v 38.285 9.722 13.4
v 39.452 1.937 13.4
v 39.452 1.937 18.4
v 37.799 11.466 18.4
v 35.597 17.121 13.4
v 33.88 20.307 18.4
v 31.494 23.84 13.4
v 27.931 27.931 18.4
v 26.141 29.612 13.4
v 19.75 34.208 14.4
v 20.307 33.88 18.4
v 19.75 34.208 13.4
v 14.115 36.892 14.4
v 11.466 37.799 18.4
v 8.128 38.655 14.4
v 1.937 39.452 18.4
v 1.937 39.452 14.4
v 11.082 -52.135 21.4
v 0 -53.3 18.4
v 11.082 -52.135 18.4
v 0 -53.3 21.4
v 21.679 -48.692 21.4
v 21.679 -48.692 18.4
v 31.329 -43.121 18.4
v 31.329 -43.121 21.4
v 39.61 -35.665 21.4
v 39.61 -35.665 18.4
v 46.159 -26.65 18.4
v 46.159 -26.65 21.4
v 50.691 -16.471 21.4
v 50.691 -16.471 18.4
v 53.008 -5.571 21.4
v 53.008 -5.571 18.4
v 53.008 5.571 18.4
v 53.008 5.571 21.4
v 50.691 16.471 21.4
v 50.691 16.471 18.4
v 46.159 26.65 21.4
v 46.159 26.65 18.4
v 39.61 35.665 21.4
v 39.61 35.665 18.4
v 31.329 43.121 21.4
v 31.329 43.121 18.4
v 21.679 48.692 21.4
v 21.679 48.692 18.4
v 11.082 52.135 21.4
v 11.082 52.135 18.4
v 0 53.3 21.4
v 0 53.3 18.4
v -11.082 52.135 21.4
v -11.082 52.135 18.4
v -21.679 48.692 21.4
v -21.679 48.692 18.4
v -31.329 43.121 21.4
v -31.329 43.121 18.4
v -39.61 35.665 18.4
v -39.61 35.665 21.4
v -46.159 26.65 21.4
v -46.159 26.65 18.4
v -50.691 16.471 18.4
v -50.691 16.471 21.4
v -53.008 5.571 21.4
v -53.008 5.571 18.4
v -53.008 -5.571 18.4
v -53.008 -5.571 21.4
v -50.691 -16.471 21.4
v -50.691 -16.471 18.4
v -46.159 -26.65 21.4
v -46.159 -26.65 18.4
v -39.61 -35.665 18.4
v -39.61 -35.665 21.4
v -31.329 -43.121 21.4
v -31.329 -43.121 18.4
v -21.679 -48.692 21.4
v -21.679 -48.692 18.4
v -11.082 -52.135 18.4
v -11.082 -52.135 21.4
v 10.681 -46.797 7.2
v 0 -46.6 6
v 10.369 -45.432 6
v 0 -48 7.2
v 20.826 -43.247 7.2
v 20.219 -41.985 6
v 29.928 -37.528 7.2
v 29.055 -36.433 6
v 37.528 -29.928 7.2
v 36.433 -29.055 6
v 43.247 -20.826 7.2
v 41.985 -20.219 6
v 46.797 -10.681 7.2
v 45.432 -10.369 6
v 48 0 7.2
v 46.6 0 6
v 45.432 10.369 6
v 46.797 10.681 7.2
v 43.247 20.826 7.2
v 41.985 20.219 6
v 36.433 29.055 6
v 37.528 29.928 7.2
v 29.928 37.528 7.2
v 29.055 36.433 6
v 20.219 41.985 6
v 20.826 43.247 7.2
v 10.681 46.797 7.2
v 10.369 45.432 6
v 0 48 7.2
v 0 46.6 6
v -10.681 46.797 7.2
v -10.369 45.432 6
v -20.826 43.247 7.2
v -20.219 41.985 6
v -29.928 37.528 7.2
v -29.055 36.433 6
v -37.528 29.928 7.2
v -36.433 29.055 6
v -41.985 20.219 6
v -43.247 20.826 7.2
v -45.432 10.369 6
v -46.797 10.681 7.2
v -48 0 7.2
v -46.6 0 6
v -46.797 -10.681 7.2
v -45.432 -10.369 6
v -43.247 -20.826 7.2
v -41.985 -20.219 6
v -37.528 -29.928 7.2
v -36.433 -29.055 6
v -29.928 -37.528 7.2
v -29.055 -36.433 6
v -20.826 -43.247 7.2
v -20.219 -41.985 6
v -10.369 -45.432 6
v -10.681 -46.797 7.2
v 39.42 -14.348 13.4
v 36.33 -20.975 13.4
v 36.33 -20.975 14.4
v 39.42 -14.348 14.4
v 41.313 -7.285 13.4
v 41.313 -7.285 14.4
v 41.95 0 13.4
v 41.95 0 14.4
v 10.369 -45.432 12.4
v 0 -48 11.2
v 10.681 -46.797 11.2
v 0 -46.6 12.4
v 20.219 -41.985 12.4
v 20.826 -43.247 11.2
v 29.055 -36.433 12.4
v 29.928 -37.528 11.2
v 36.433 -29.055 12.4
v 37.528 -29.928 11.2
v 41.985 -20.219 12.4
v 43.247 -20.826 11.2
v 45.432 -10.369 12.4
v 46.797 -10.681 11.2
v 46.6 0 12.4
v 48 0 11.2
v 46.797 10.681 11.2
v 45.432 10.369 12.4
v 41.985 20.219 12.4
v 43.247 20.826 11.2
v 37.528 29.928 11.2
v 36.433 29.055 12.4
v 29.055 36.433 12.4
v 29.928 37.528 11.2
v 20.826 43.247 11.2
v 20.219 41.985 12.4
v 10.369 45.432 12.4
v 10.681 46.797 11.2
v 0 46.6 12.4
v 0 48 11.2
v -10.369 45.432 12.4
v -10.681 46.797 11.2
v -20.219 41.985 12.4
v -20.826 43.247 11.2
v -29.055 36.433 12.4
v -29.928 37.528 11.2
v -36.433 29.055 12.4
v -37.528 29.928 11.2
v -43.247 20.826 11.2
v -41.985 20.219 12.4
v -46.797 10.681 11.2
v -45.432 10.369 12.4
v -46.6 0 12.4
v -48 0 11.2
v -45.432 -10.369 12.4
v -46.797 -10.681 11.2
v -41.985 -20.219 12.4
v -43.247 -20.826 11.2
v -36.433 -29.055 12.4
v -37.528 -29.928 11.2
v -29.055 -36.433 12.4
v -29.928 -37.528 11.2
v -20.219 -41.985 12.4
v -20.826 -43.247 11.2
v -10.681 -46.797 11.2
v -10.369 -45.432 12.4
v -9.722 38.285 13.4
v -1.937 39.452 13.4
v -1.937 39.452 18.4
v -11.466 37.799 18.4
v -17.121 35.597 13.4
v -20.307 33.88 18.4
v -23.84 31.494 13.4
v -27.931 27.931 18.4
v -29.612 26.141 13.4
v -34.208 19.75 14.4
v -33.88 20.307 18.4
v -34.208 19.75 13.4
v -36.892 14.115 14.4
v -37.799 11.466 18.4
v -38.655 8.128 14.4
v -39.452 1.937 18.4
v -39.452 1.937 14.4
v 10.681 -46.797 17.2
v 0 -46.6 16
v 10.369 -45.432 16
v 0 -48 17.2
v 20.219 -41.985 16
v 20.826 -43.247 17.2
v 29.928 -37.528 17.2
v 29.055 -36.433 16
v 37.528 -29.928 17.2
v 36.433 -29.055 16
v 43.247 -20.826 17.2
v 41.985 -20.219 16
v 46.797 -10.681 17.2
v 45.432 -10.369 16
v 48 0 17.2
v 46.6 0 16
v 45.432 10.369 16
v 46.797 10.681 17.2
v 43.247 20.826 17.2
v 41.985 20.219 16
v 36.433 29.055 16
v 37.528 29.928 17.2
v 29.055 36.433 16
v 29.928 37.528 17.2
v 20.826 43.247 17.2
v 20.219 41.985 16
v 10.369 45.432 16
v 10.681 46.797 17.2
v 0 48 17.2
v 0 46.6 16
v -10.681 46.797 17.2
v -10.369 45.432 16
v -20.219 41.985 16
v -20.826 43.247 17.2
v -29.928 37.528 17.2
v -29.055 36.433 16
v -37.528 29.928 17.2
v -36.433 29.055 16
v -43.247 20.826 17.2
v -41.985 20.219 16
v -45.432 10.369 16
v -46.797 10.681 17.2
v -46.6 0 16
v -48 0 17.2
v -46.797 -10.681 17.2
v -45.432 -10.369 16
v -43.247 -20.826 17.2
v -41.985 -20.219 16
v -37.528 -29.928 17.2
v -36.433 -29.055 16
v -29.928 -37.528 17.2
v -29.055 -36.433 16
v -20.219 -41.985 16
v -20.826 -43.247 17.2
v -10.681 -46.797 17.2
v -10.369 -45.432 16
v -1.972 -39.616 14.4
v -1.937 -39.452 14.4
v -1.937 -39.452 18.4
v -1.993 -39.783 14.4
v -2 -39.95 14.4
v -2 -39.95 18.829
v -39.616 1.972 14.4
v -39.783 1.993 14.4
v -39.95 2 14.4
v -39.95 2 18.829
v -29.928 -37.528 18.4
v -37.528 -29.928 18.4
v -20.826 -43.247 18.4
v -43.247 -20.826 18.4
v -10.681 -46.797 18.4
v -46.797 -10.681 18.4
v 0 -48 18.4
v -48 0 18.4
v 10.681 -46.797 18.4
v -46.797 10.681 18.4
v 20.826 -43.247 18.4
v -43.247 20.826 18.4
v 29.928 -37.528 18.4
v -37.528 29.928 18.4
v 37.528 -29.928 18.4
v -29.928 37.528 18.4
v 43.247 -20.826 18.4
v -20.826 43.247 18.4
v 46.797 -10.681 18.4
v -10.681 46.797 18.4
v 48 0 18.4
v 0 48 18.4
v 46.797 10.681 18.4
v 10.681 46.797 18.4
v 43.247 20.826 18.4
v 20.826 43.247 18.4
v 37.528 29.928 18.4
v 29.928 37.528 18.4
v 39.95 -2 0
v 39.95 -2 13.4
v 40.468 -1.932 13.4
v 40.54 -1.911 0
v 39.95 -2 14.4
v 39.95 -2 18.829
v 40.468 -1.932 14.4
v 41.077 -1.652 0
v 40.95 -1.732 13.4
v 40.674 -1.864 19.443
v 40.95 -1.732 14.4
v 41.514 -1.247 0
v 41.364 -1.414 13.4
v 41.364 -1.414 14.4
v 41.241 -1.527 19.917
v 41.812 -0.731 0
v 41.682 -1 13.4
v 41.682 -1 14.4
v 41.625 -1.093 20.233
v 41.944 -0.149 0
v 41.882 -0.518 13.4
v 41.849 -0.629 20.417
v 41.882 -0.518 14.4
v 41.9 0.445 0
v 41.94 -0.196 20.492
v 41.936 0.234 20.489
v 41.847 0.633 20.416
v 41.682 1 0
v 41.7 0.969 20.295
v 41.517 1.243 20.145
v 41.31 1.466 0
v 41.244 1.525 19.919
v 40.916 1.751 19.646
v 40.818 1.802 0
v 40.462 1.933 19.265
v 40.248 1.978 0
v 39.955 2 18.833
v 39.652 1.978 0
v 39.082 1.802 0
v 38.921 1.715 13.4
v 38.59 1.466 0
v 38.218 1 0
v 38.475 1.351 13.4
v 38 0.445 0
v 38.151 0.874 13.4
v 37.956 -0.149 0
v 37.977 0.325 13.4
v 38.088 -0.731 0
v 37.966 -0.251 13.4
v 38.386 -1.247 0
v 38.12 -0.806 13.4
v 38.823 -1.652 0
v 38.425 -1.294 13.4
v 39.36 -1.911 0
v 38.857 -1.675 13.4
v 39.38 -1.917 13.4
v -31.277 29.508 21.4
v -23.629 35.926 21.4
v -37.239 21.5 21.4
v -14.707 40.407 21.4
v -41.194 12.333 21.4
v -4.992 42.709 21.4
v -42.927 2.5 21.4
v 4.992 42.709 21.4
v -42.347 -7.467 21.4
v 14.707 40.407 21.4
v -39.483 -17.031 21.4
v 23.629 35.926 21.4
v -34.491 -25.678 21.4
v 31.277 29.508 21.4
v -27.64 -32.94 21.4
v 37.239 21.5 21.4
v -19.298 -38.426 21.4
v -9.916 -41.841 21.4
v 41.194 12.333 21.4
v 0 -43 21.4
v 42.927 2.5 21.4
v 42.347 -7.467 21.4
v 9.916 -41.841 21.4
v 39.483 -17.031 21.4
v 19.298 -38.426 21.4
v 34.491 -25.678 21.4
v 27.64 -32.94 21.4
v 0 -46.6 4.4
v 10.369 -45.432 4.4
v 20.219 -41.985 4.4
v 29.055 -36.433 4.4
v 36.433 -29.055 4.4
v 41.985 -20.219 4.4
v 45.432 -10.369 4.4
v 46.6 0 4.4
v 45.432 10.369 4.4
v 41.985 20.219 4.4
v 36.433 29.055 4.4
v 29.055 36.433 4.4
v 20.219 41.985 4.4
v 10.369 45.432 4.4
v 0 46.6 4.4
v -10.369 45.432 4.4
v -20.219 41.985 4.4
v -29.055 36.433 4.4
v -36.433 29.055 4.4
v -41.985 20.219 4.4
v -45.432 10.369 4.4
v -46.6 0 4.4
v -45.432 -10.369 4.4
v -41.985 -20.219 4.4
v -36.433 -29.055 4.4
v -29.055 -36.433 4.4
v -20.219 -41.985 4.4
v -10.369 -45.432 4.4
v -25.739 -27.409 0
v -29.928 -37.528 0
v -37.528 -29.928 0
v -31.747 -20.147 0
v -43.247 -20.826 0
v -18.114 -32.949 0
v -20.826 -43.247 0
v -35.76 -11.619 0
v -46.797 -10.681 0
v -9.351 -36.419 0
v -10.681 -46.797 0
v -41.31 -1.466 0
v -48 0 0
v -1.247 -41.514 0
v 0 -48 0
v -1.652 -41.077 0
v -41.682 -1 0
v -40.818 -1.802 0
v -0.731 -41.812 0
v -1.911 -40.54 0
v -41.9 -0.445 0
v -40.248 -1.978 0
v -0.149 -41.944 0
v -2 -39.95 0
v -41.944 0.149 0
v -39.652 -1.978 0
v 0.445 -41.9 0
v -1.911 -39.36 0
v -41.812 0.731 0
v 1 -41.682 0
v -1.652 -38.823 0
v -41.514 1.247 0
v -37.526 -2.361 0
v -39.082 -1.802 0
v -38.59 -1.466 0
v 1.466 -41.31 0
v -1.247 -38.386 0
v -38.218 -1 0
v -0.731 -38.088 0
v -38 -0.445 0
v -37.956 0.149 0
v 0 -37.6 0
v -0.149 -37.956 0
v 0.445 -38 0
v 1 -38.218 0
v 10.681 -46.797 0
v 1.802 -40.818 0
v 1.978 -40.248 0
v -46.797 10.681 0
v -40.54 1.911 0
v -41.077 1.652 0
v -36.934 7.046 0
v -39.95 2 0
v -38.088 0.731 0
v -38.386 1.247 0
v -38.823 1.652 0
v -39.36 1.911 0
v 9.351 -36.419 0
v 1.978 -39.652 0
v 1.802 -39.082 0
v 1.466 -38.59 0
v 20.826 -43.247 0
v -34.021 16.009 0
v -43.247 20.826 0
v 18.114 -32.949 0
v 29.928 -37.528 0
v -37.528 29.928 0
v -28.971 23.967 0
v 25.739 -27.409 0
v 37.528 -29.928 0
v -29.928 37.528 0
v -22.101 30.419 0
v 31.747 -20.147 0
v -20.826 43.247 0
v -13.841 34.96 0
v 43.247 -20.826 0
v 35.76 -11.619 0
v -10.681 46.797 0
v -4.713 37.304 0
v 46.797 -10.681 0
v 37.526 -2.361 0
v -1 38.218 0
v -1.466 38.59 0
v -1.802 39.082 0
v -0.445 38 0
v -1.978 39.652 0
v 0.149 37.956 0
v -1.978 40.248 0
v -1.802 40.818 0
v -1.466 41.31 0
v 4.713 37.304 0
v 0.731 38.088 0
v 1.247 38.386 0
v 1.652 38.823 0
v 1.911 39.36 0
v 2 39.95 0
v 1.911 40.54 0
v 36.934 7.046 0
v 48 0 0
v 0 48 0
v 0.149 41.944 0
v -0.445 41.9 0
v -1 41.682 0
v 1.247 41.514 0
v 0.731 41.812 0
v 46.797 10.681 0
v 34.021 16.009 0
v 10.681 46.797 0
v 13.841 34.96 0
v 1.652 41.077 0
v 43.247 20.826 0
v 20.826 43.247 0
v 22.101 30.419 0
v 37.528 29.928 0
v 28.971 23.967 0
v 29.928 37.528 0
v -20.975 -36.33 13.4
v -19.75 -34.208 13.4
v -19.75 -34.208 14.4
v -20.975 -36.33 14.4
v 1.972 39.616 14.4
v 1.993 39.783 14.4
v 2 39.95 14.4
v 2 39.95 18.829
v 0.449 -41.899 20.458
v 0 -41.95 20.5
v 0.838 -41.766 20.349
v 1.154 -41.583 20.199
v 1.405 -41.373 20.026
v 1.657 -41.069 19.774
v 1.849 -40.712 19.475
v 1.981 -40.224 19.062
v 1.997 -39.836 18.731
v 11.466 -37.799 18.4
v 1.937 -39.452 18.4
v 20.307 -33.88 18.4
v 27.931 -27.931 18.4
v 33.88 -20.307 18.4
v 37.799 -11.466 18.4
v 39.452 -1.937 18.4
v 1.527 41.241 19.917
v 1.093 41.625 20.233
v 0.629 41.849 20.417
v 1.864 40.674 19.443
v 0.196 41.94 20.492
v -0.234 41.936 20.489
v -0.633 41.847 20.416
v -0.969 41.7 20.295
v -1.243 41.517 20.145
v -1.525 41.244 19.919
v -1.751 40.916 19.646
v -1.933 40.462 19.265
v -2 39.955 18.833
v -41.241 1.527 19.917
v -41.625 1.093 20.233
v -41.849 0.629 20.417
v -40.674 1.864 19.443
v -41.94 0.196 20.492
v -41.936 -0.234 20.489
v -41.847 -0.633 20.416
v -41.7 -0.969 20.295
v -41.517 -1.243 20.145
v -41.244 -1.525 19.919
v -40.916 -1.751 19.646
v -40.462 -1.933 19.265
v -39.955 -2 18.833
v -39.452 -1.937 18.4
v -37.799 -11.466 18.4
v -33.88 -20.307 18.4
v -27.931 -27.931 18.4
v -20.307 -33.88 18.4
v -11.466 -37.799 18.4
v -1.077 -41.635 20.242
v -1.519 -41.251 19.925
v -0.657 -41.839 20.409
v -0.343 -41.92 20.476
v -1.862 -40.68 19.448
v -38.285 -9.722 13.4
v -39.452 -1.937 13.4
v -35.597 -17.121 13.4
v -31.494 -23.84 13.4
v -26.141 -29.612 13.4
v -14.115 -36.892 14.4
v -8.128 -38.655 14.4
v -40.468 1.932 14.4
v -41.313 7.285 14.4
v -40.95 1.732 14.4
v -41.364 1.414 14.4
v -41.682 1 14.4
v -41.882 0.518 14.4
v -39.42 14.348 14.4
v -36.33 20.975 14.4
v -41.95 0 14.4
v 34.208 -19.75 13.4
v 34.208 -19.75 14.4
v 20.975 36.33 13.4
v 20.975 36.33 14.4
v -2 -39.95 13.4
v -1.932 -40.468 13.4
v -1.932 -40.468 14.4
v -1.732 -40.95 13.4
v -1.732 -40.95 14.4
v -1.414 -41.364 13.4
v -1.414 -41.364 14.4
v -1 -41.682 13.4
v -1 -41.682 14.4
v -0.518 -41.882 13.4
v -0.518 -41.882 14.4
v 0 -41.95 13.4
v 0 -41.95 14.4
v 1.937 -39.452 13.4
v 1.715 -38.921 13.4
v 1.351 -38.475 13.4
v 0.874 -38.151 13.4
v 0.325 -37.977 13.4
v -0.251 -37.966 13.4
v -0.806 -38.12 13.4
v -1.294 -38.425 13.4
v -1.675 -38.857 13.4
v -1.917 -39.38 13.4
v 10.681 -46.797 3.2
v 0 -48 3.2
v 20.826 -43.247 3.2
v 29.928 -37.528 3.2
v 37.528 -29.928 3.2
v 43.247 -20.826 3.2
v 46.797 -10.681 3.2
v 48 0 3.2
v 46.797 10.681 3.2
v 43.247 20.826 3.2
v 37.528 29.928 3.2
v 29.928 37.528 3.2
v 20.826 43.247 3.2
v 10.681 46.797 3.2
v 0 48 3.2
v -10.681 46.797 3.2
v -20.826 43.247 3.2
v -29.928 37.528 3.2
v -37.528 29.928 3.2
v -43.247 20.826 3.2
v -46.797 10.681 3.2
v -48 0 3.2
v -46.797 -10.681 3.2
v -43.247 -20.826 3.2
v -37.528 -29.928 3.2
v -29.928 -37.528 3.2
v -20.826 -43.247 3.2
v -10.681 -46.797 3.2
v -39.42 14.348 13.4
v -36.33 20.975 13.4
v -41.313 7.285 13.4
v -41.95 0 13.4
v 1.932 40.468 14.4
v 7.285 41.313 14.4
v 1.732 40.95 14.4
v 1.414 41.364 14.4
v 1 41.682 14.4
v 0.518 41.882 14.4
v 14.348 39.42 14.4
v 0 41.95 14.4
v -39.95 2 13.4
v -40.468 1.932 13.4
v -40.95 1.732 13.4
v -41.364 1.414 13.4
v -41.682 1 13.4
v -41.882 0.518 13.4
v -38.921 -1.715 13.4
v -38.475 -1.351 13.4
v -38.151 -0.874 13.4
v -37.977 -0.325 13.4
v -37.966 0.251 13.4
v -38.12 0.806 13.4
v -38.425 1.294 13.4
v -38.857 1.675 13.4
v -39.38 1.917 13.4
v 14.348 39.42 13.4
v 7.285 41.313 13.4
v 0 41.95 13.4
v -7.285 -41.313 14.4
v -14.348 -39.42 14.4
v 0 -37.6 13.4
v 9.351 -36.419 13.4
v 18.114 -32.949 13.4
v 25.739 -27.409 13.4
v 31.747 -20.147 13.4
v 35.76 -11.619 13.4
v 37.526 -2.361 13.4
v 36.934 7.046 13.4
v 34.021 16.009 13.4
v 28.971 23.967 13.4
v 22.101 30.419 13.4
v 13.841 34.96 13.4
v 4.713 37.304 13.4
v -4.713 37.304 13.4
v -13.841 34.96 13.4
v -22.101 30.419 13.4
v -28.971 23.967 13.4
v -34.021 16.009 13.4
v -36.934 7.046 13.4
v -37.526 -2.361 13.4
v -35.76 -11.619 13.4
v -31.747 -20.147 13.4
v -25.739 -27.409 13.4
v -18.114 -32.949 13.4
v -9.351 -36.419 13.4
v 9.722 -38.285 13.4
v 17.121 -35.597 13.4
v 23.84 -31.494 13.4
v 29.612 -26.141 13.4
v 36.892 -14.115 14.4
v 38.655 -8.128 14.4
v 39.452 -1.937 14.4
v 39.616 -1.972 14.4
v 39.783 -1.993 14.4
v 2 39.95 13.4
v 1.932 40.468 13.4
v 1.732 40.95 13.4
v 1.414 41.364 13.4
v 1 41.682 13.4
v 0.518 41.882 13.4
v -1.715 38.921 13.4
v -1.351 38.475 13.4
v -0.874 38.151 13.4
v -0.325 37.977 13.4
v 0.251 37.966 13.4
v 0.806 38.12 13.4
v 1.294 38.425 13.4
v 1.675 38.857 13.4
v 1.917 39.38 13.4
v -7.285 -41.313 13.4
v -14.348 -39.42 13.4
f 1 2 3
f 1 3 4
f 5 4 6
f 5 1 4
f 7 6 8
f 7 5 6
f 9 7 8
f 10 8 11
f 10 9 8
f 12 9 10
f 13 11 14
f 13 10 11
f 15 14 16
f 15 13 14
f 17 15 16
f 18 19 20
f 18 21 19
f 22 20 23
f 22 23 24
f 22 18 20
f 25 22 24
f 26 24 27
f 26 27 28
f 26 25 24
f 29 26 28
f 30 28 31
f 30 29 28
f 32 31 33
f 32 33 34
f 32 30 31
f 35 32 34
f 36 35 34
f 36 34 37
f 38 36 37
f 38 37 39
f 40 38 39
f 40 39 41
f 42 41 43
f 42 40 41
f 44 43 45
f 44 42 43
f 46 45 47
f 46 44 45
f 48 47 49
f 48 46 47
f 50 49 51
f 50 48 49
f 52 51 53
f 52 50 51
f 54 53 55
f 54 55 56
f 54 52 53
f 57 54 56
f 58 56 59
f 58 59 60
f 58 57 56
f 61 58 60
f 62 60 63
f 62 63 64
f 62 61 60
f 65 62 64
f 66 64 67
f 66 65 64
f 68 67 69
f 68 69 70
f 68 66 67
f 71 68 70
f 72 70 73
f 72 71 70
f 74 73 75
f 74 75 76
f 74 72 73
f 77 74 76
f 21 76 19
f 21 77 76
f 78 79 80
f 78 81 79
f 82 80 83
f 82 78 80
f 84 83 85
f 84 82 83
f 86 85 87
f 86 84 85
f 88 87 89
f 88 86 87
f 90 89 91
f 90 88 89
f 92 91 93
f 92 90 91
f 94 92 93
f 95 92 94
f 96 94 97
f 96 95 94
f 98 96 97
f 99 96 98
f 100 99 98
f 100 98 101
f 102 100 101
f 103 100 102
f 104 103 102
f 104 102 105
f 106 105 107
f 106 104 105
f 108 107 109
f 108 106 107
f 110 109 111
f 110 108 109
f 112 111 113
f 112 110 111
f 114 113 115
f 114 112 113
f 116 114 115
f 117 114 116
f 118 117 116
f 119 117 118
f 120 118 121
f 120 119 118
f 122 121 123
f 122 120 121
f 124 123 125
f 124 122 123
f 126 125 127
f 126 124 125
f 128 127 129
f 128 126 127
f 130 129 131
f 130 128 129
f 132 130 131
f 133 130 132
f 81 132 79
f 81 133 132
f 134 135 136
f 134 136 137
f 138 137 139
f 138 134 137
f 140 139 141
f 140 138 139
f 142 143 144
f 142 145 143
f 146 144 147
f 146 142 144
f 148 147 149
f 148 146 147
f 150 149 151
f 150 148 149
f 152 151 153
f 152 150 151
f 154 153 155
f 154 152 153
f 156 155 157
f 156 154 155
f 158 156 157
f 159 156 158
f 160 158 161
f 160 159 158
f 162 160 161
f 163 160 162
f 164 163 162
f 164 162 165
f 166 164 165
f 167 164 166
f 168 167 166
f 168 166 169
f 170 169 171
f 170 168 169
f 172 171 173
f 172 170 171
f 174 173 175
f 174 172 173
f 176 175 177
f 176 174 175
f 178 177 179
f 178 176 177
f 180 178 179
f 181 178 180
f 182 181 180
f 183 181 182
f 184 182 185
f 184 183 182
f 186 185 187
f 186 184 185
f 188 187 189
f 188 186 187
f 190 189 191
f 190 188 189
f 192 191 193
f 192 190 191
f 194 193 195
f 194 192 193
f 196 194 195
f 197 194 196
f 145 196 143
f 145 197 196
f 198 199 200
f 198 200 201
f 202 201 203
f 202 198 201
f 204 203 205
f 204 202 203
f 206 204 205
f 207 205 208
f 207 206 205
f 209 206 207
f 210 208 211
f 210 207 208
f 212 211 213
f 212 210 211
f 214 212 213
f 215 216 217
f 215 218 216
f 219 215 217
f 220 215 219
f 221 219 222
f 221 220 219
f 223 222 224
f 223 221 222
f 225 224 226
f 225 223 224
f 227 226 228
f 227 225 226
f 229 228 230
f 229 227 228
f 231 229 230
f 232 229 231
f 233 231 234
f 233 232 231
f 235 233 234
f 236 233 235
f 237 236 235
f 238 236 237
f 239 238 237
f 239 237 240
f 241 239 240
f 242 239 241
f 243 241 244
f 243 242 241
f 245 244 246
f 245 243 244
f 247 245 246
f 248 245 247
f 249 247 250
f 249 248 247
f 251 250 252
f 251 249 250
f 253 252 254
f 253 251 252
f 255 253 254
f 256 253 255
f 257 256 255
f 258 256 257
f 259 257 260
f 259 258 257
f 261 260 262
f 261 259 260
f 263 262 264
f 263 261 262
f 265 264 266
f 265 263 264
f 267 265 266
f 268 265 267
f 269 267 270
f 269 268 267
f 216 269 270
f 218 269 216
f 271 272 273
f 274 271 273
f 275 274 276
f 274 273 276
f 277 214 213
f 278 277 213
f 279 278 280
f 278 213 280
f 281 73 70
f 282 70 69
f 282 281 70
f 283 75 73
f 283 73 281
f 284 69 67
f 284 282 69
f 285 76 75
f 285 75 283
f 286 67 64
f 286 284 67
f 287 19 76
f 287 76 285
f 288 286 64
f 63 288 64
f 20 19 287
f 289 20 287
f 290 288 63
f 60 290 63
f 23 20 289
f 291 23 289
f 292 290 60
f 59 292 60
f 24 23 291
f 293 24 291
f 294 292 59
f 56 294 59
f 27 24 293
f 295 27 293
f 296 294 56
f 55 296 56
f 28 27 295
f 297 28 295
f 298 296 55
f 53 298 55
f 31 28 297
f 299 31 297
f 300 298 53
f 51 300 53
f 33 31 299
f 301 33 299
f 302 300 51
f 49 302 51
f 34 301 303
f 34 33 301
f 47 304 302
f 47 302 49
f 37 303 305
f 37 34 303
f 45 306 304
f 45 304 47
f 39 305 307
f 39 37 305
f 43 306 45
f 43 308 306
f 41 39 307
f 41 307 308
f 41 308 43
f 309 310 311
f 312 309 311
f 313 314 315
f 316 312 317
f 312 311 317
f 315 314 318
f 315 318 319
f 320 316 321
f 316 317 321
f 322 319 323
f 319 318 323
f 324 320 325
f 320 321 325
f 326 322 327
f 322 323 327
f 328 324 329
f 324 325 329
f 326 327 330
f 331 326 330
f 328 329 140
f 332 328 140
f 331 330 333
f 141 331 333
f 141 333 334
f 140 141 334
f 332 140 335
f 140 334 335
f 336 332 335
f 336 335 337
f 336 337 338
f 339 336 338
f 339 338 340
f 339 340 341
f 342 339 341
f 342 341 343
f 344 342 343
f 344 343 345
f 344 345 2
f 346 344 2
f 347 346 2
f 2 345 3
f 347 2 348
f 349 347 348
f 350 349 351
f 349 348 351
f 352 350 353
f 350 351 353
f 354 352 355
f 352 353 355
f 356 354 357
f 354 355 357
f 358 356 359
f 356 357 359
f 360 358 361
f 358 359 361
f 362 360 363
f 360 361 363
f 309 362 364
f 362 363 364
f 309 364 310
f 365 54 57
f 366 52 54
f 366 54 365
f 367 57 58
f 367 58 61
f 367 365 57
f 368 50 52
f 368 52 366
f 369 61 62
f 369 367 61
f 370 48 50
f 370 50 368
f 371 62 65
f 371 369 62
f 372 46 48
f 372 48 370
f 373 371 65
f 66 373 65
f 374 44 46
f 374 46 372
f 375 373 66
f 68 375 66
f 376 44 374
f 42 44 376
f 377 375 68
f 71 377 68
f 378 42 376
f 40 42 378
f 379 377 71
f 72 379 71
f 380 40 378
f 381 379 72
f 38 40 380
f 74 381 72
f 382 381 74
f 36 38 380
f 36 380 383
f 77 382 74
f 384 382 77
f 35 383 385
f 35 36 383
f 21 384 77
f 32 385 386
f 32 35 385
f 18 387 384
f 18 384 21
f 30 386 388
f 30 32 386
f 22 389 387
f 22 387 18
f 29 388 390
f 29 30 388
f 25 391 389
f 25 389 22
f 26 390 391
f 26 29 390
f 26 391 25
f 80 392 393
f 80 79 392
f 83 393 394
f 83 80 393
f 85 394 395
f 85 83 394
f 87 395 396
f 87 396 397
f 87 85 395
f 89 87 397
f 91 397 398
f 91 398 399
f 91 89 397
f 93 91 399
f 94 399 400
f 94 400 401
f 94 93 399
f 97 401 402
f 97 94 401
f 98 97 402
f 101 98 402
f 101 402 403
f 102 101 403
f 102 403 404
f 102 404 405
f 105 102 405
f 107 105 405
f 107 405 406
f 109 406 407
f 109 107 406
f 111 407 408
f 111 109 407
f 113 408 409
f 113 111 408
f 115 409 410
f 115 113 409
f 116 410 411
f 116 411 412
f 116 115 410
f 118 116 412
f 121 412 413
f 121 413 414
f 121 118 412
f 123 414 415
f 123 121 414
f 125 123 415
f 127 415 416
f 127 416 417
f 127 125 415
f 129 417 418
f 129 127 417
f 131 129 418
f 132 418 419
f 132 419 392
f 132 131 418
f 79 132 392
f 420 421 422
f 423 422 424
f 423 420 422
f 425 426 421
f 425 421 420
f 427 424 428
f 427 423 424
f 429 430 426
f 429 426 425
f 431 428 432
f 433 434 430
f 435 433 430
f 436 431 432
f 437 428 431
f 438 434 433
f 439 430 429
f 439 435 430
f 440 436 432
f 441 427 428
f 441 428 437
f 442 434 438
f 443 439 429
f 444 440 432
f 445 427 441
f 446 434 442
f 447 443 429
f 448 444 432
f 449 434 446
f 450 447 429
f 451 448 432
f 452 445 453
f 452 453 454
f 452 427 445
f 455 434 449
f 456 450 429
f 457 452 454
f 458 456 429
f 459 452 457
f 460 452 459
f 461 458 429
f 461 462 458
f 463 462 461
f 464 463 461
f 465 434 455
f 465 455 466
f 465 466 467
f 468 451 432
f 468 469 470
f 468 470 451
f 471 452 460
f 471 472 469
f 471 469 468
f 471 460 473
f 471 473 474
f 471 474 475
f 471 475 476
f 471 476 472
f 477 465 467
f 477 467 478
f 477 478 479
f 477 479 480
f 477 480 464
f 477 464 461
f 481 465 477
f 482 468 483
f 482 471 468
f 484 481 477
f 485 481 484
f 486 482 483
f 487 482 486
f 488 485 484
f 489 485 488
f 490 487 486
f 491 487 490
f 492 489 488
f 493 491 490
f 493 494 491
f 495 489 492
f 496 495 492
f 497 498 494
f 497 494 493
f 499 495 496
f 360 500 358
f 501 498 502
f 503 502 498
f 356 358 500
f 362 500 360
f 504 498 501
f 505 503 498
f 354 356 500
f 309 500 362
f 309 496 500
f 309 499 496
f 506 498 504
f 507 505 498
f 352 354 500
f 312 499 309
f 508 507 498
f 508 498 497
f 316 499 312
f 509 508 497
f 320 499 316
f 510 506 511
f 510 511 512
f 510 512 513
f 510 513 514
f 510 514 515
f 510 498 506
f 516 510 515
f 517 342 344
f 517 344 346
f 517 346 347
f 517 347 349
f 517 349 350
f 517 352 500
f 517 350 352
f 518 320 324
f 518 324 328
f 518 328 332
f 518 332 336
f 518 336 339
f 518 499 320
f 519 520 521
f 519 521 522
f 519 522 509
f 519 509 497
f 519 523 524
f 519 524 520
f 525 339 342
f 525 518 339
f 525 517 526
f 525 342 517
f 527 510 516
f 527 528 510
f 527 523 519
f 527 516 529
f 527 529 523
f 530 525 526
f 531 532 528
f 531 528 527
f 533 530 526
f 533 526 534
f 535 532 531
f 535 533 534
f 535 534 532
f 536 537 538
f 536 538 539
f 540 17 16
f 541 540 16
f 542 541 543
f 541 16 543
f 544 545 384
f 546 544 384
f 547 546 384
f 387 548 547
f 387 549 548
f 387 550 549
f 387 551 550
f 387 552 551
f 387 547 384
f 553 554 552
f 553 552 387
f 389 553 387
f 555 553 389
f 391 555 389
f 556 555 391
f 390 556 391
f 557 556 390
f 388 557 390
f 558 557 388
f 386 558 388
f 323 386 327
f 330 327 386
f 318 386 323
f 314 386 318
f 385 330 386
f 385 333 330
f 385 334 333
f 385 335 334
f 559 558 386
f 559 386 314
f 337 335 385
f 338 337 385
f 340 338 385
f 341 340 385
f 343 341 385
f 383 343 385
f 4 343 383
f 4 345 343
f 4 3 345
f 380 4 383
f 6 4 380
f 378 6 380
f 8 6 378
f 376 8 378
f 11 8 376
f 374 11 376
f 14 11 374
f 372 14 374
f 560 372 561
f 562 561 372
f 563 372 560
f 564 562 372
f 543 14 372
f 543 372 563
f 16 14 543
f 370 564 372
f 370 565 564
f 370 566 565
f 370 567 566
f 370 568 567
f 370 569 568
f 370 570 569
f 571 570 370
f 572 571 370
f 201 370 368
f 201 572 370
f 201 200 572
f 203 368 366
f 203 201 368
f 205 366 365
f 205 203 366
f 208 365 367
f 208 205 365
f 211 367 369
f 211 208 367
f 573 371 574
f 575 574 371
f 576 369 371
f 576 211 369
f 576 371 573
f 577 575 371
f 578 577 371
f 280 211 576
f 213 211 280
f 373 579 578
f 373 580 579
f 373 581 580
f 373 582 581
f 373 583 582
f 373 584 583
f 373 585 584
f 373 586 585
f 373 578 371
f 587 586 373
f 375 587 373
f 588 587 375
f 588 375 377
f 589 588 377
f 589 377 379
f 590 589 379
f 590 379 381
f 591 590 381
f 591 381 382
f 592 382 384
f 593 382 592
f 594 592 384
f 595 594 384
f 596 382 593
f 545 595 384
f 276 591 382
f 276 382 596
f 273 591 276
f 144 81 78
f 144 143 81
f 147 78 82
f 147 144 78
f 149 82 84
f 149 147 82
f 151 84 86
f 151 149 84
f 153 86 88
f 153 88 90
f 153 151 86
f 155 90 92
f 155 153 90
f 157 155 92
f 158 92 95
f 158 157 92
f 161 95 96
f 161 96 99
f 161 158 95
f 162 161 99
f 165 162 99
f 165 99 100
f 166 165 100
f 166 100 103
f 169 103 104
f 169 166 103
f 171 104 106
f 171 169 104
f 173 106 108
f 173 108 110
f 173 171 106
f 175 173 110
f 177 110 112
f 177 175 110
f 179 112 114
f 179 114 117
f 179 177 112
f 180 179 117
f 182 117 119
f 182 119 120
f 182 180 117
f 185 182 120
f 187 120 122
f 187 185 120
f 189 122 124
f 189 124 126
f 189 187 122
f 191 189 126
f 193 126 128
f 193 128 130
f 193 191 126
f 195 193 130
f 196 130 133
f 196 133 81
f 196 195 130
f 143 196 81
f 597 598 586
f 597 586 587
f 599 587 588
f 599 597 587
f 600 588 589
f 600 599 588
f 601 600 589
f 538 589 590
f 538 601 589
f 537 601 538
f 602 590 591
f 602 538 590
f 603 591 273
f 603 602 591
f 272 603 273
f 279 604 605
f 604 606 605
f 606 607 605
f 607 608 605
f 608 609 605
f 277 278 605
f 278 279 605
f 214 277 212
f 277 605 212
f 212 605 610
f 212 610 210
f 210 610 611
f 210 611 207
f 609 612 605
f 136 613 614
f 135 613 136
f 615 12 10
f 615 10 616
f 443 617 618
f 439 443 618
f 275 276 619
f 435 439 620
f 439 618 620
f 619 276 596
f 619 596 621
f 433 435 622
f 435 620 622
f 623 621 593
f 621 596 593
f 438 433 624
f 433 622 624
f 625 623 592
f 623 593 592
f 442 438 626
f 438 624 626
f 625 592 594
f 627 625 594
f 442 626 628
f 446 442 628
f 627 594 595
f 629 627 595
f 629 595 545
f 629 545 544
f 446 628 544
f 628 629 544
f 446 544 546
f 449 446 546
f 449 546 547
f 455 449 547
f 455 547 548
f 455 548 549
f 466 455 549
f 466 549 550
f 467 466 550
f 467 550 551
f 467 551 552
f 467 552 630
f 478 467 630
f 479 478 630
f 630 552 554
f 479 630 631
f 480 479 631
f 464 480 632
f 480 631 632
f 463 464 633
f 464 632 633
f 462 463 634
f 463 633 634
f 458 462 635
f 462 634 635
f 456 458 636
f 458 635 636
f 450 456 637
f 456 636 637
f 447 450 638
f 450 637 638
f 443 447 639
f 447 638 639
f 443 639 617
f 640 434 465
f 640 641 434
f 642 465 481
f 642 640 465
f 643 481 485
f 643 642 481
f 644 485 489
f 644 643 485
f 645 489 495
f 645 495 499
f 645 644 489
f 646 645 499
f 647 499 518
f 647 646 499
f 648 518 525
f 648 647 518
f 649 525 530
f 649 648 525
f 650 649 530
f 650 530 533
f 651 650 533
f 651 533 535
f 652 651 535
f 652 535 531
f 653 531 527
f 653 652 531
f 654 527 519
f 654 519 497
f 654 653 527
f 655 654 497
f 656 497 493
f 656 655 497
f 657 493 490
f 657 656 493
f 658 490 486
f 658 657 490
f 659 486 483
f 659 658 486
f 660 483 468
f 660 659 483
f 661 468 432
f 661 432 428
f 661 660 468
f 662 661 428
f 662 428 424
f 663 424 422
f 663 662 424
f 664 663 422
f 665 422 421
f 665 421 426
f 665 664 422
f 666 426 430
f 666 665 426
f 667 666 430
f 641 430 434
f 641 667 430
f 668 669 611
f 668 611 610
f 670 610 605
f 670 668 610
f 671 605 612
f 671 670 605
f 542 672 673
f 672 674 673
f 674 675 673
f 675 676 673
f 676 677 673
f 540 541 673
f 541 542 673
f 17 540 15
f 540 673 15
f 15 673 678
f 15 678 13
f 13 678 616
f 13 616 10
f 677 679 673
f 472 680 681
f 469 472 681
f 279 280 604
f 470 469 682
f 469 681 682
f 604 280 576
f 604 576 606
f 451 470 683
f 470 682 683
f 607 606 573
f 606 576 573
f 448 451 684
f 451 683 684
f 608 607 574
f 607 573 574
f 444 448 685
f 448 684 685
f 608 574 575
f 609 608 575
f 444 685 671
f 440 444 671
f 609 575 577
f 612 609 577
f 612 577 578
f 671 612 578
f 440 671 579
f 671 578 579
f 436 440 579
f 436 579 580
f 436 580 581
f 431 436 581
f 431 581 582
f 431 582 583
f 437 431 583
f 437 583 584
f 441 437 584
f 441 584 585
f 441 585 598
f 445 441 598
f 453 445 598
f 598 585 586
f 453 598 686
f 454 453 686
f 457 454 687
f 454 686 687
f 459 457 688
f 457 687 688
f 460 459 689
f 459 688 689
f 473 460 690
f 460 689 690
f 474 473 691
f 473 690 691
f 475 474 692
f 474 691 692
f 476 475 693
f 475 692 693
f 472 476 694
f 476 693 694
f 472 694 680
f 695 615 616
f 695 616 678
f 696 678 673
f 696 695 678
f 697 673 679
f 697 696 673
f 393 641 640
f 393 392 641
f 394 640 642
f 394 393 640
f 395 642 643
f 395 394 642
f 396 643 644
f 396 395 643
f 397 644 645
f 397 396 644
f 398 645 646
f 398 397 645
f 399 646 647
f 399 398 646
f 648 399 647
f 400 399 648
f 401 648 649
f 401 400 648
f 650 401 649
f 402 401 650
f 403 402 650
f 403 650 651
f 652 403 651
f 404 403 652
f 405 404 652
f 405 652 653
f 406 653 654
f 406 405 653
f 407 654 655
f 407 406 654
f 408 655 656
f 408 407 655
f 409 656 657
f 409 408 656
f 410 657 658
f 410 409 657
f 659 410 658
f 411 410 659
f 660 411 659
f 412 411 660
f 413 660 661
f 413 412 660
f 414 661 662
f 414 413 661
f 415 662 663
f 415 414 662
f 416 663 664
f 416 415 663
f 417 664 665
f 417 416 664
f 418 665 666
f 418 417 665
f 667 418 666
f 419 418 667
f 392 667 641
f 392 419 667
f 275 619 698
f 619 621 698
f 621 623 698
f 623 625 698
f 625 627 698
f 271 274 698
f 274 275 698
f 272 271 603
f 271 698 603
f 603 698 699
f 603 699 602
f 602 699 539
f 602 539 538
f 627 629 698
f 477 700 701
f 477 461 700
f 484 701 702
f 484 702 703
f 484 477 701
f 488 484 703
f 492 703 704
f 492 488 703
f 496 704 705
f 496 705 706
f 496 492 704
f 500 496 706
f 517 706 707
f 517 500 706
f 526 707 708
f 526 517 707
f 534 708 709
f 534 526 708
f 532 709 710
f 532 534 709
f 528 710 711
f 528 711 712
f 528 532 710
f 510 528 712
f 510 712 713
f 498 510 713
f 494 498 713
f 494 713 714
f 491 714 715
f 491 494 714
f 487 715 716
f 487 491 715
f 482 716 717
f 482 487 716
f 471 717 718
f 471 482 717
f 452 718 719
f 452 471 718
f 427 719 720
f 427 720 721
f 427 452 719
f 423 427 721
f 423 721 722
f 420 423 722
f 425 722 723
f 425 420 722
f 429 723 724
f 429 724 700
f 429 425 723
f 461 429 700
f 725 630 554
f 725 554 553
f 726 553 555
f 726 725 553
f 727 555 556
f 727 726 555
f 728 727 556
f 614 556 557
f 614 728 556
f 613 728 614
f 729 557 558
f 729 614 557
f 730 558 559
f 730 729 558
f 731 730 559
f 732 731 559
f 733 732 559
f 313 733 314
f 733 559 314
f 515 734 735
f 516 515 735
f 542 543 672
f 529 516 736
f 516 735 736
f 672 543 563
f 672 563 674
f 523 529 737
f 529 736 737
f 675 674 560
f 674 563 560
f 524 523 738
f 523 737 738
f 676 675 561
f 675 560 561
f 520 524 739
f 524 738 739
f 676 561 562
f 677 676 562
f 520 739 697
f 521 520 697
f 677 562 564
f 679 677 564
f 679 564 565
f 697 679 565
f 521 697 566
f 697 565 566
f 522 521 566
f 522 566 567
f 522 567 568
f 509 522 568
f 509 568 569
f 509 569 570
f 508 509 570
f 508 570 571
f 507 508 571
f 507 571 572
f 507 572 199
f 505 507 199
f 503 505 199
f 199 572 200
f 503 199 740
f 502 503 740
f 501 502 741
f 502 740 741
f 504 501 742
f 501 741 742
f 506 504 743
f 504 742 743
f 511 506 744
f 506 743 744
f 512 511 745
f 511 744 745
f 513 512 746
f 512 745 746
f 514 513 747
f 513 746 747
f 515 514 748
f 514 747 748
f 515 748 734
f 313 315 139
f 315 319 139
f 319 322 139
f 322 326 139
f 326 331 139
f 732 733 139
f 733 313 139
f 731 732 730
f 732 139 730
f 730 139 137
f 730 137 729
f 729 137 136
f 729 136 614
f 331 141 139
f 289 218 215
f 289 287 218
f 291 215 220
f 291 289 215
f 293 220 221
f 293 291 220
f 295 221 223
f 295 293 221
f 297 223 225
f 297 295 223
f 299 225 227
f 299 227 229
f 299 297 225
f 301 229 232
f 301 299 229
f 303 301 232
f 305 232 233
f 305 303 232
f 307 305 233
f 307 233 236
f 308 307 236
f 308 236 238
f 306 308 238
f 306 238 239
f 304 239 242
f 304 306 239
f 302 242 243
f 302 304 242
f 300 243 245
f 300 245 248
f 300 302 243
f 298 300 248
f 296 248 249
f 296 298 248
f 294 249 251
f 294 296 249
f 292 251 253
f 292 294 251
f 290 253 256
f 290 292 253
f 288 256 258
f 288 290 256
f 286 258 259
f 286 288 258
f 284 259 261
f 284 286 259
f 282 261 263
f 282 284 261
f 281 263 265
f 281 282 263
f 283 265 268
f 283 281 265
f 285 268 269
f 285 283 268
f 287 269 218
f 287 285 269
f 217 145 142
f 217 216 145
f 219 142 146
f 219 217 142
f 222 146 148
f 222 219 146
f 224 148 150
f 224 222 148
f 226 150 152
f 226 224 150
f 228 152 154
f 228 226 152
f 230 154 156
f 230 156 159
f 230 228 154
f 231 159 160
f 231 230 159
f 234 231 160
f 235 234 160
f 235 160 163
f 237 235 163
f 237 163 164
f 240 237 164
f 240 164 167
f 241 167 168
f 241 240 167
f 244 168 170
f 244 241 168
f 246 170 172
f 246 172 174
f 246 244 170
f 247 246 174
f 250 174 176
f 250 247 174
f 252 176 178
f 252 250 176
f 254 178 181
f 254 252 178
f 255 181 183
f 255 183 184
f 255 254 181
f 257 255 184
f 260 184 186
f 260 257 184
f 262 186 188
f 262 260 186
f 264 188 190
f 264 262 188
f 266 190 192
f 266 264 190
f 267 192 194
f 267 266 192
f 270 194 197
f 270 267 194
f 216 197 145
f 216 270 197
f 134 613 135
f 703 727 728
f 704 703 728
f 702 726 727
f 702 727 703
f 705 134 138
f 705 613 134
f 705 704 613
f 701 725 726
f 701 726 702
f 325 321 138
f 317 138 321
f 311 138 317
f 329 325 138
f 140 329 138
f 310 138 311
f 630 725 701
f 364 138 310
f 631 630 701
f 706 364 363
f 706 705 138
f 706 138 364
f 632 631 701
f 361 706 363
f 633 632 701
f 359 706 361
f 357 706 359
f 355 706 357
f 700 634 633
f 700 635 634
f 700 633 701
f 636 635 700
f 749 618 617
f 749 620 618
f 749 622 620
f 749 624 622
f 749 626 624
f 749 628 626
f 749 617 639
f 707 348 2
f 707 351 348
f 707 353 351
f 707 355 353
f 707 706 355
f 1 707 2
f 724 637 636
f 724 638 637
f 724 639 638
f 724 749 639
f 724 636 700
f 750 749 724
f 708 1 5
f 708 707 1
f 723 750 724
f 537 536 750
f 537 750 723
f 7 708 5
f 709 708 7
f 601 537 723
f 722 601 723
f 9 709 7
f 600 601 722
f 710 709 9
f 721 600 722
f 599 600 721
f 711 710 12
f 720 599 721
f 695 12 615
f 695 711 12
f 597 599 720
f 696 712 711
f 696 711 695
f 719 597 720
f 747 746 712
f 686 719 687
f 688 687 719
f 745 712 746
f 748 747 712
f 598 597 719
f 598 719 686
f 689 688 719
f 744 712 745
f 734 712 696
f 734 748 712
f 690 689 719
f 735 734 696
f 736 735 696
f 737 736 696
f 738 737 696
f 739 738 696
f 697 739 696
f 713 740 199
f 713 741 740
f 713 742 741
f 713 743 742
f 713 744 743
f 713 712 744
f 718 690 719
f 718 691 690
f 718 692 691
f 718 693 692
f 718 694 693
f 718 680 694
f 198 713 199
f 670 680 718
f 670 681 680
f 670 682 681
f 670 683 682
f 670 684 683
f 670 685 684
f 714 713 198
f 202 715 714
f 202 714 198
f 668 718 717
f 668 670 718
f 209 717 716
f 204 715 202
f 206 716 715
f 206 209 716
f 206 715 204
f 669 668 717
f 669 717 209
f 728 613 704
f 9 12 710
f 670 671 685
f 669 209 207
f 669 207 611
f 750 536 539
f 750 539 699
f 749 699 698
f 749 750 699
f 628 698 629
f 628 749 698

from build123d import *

# Parameters (mm, degrees)
SKETCH001_R           = 2
POCKET_DEPTH          = 317.933954
POCKET_DEPTH_BACK     = 312.533954
POLARPATTERN_COUNT    = 4
POCKET001_DEPTH       = 1
POLARPATTERN001_COUNT = 4


with BuildPart() as part:
    # Sketch → Revolution (revolve)
    with BuildSketch(Plane.YZ):
        Polygon((-37.6, 0), (-48, 0), (-48, 3.2), (-46.6, 4.4), (-46.6, 6), (-48, 7.2), (-48, 11.2), (-46.6, 12.4), (-46.6, 16), (-48, 17.2), (-48, 18.4), (-53.3, 18.4), (-53.3, 21.4), (-43, 21.4), (-39.5, 18.4), (-39.5, 13.4), (-37.6, 13.4), align=None)
    revolve(axis=Axis((0, 0, 0), (0, 0, 1)))

    # Sketch001 (on Face16 of Revolution) → Pocket (cut, two sides)
    with BuildSketch(Plane(origin=(0, 0, 13.4), x_dir=(0, -1, 0), z_dir=(0, 0, 1))) as pocket_sk:
        with Locations((0, 39.95)):
            Circle(SKETCH001_R)
    pocket = extrude(amount=-POCKET_DEPTH, mode=Mode.SUBTRACT) + extrude(pocket_sk.sketch, amount=POCKET_DEPTH_BACK, mode=Mode.SUBTRACT)

    # PolarPattern: Pocket ×4 about axis
    polarpattern_axis = Axis((0, 0, 13.4), (0, 0, 1))
    for i in range(1, POLARPATTERN_COUNT):
        add(pocket.rotate(polarpattern_axis, i * 360 / POLARPATTERN_COUNT), mode=Mode.SUBTRACT)

    # Sketch002 (on Face11 of PolarPattern) → Pocket001 (cut)
    with BuildSketch(Plane(origin=(0, 0, 13.4), x_dir=(0, -1, 0), z_dir=(0, 0, 1))):
        with BuildLine():
            Line((-41.95, 0), (0, 0))
            Line((0, 0), (-36.329766, 20.975))
            ThreePointArc((-36.329766, 20.975), (-40.520588, 10.857459), (-41.95, 0))
        make_face()
    pocket001 = extrude(amount=POCKET001_DEPTH, mode=Mode.SUBTRACT)

    # PolarPattern001: Pocket001 ×4 about axis
    polarpattern001_axis = Axis((0, 0, 13.4), (0, 0, 1))
    for i in range(1, POLARPATTERN001_COUNT):
        add(pocket001.rotate(polarpattern001_axis, i * 360 / POLARPATTERN001_COUNT), mode=Mode.SUBTRACT)


solid = part.part
